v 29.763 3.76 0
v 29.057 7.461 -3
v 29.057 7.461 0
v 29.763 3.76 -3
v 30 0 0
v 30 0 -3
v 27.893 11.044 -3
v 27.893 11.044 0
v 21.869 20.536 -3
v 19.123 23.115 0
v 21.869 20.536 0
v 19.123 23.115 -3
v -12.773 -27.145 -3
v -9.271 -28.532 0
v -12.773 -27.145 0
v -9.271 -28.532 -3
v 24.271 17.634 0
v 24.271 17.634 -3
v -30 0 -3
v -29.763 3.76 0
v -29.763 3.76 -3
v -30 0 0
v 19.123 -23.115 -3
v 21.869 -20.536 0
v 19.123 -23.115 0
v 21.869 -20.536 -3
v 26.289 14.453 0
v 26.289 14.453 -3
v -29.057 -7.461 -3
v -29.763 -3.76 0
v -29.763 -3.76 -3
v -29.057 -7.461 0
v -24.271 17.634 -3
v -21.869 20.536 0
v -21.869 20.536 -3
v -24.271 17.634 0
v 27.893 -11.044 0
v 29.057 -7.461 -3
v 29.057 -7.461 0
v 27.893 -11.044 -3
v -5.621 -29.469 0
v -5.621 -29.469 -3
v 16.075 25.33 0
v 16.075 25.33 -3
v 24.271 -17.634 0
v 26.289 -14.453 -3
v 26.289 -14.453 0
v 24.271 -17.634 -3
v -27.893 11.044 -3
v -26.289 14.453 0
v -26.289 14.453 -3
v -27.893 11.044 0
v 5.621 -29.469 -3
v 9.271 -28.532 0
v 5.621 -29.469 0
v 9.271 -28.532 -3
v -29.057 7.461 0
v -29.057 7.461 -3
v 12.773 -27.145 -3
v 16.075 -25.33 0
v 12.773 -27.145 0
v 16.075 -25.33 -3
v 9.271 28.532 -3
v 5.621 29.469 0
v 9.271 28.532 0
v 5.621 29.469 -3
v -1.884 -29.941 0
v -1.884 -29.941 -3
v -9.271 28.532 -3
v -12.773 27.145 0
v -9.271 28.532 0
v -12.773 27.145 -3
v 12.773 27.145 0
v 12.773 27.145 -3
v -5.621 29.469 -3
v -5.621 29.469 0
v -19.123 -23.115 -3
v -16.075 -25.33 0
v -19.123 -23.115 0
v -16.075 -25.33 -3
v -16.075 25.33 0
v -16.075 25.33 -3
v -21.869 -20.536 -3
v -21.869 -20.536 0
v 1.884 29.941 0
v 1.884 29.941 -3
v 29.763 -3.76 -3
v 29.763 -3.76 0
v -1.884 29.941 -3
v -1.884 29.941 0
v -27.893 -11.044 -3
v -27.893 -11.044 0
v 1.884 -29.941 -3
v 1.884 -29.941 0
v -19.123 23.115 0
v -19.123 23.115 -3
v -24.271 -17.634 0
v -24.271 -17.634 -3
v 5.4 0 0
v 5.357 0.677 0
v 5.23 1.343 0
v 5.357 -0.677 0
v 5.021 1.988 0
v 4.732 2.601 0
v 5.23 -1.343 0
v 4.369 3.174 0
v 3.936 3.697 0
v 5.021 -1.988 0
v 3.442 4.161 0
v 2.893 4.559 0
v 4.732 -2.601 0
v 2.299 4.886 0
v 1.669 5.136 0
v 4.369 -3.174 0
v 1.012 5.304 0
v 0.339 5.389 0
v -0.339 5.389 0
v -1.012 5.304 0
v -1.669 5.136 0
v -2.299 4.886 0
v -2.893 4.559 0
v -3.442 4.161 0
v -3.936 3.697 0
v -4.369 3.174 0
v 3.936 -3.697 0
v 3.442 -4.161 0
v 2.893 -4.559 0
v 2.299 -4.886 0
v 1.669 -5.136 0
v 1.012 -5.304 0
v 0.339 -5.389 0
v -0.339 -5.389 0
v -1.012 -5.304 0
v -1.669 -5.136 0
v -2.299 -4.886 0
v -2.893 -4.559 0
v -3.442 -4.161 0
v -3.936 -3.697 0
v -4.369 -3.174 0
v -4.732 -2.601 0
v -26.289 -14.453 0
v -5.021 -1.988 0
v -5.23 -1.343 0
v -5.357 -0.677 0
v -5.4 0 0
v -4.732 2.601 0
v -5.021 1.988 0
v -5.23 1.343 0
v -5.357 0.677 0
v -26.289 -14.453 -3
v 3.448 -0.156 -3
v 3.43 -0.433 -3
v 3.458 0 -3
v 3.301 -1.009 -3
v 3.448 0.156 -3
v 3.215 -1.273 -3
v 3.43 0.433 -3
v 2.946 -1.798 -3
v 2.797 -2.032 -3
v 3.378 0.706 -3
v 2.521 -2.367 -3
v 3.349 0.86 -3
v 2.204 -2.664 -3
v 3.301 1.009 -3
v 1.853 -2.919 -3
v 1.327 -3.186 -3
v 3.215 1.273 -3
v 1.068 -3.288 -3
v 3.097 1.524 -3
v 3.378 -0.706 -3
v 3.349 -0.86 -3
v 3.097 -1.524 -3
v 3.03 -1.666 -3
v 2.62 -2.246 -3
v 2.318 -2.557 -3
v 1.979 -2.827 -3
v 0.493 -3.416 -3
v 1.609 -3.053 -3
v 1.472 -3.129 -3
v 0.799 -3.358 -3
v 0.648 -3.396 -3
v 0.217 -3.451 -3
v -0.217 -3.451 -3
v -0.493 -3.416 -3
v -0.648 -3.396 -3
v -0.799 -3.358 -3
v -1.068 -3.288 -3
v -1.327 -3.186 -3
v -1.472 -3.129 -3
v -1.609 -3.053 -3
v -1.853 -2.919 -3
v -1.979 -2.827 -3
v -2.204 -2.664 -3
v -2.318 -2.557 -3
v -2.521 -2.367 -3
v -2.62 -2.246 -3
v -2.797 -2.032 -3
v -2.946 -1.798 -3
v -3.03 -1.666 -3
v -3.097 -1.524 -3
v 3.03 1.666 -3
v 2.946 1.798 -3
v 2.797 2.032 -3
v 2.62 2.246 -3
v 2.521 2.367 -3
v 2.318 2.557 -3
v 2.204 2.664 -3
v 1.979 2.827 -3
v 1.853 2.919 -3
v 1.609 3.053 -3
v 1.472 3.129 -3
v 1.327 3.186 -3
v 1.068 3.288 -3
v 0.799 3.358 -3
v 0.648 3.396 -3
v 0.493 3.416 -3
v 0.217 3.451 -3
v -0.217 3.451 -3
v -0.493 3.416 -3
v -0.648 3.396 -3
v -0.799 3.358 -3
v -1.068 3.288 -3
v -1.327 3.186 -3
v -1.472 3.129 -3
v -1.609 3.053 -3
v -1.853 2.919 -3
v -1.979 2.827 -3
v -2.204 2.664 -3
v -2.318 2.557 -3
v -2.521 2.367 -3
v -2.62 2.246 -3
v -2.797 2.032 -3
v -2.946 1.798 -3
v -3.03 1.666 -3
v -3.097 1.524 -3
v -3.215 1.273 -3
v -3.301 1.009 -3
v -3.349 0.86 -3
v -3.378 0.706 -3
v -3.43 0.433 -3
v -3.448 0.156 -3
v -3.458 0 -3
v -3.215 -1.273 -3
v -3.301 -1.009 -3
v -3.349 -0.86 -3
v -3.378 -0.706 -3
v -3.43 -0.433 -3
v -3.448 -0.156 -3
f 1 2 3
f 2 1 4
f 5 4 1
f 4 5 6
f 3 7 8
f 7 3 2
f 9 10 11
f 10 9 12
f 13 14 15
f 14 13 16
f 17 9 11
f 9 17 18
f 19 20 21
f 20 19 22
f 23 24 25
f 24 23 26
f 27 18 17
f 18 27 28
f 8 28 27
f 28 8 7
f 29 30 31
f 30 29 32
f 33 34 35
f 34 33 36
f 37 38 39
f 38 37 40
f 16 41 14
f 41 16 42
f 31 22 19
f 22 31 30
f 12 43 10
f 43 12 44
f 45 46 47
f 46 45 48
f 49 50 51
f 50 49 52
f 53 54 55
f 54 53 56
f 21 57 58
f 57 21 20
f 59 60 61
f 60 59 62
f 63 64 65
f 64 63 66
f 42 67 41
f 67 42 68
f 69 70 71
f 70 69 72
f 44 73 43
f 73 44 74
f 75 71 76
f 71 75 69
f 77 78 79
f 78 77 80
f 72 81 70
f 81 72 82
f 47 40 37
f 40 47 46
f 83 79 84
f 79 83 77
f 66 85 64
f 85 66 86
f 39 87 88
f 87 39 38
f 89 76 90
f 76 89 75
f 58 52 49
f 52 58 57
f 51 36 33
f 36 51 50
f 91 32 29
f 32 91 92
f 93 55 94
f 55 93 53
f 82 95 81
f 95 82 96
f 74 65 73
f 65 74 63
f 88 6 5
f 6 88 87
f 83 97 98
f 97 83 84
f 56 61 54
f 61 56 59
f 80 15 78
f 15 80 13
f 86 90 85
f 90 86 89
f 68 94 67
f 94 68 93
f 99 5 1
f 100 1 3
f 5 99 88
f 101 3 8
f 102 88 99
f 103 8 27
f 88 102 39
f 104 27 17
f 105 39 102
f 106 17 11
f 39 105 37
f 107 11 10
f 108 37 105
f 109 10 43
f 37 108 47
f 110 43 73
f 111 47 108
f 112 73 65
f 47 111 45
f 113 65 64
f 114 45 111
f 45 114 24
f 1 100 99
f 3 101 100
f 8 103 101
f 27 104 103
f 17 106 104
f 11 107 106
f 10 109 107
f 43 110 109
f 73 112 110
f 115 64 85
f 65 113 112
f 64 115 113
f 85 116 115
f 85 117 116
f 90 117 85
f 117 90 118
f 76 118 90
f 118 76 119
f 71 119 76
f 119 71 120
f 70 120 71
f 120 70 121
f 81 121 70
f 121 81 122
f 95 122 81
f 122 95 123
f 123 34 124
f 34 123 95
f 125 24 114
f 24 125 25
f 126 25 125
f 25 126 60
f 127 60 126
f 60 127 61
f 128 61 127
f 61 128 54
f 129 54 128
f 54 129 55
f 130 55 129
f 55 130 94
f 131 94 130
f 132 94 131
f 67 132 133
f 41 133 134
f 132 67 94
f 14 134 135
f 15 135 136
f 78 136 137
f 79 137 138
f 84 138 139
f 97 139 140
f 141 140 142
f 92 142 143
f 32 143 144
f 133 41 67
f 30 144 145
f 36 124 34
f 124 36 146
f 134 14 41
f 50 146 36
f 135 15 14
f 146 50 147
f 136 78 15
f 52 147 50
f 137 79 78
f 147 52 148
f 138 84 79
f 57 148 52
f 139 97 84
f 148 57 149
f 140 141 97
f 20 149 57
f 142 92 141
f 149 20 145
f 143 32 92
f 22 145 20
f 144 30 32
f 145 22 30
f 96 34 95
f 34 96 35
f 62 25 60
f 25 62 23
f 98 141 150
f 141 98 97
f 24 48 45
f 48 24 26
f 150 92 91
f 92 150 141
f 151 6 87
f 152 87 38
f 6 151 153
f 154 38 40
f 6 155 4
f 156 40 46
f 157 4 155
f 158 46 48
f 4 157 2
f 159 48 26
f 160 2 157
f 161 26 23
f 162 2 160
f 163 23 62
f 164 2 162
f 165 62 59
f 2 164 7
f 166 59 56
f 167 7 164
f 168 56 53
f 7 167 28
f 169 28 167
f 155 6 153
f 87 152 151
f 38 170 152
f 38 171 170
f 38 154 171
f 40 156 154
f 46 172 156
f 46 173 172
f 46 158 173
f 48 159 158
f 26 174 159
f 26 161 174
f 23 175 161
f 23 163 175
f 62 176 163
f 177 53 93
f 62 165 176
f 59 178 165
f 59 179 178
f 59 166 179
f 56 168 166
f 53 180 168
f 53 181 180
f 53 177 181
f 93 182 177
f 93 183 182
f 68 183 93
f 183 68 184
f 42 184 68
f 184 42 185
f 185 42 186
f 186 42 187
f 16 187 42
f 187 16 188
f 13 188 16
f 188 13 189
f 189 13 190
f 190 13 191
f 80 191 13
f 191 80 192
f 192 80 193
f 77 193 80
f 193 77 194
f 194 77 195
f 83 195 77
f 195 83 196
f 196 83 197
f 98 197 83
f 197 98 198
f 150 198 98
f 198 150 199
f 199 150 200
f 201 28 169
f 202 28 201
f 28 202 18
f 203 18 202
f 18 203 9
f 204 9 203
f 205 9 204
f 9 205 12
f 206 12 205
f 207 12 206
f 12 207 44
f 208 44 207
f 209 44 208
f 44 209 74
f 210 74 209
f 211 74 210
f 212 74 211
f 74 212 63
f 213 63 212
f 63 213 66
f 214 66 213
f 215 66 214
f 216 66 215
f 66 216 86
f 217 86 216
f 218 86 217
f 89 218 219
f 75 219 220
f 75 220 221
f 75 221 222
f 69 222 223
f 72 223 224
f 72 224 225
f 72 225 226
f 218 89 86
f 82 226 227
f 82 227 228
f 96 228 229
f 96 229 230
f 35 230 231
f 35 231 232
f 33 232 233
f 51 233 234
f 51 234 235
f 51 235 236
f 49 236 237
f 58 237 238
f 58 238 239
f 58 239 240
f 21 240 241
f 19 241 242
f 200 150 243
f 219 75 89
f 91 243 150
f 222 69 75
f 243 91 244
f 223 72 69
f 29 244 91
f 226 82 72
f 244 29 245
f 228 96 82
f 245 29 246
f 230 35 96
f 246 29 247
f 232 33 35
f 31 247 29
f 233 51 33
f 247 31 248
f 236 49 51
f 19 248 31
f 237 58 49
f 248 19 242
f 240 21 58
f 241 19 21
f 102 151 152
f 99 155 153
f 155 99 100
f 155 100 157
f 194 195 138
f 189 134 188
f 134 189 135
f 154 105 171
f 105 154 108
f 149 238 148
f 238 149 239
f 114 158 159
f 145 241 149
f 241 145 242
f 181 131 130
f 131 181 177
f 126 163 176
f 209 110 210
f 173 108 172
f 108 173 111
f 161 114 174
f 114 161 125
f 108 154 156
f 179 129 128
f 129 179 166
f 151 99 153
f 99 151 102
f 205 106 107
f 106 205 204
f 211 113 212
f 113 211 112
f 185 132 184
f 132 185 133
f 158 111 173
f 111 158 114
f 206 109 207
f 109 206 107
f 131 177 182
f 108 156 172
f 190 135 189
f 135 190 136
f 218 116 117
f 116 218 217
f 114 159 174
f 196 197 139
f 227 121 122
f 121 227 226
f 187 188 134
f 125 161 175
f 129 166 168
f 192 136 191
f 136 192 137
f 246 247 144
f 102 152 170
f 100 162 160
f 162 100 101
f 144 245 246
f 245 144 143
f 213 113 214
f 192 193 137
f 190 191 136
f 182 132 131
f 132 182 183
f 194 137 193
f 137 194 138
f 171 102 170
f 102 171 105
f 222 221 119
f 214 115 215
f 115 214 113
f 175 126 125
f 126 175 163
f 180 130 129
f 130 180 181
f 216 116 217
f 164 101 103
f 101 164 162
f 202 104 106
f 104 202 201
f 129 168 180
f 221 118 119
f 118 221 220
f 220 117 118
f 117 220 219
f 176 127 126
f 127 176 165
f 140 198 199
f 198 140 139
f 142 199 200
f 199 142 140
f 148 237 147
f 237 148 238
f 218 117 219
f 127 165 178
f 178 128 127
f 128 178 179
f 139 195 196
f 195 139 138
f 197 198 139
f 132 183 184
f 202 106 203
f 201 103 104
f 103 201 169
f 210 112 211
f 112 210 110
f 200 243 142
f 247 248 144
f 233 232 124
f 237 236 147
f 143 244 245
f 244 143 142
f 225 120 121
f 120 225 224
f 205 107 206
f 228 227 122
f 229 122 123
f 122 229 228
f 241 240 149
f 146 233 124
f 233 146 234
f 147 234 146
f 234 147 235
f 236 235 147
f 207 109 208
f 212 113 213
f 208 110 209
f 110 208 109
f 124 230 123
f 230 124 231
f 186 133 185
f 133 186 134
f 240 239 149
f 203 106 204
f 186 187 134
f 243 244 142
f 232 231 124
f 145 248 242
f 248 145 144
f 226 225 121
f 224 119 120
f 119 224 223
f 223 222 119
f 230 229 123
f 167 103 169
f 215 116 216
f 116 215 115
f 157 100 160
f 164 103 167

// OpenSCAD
$fn = 50;

difference() {
	union() {
		translate(v = [0, 0, -3.0]) {
			cylinder(h = 3, r = 30.0);
		}
		#translate(v = [0, 0, -6.0]) {
			cylinder(h = 6, r = 2.875);
		}
	}
	union() {
		translate(v = [0, 0, 0]) {
			rotate(a = [0, 0, 0]) {
				difference() {
					union() {
						translate(v = [0, 0, -6.0]) {
							cylinder(h = 6, r = 2.6);
						}
						translate(v = [0, 0, -3.9]) {
							cylinder(h = 3.9, r1 = 2.875, r2 = 5.4);
						}
						translate(v = [0, 0, -6.0]) {
							cylinder(h = 6, r = 2.875);
						}
						translate(v = [0, 0, -6.0]) {
							cylinder(h = 6, r = 2.6);
						}
					}
					union();
				}
			}
		}
	}
}
